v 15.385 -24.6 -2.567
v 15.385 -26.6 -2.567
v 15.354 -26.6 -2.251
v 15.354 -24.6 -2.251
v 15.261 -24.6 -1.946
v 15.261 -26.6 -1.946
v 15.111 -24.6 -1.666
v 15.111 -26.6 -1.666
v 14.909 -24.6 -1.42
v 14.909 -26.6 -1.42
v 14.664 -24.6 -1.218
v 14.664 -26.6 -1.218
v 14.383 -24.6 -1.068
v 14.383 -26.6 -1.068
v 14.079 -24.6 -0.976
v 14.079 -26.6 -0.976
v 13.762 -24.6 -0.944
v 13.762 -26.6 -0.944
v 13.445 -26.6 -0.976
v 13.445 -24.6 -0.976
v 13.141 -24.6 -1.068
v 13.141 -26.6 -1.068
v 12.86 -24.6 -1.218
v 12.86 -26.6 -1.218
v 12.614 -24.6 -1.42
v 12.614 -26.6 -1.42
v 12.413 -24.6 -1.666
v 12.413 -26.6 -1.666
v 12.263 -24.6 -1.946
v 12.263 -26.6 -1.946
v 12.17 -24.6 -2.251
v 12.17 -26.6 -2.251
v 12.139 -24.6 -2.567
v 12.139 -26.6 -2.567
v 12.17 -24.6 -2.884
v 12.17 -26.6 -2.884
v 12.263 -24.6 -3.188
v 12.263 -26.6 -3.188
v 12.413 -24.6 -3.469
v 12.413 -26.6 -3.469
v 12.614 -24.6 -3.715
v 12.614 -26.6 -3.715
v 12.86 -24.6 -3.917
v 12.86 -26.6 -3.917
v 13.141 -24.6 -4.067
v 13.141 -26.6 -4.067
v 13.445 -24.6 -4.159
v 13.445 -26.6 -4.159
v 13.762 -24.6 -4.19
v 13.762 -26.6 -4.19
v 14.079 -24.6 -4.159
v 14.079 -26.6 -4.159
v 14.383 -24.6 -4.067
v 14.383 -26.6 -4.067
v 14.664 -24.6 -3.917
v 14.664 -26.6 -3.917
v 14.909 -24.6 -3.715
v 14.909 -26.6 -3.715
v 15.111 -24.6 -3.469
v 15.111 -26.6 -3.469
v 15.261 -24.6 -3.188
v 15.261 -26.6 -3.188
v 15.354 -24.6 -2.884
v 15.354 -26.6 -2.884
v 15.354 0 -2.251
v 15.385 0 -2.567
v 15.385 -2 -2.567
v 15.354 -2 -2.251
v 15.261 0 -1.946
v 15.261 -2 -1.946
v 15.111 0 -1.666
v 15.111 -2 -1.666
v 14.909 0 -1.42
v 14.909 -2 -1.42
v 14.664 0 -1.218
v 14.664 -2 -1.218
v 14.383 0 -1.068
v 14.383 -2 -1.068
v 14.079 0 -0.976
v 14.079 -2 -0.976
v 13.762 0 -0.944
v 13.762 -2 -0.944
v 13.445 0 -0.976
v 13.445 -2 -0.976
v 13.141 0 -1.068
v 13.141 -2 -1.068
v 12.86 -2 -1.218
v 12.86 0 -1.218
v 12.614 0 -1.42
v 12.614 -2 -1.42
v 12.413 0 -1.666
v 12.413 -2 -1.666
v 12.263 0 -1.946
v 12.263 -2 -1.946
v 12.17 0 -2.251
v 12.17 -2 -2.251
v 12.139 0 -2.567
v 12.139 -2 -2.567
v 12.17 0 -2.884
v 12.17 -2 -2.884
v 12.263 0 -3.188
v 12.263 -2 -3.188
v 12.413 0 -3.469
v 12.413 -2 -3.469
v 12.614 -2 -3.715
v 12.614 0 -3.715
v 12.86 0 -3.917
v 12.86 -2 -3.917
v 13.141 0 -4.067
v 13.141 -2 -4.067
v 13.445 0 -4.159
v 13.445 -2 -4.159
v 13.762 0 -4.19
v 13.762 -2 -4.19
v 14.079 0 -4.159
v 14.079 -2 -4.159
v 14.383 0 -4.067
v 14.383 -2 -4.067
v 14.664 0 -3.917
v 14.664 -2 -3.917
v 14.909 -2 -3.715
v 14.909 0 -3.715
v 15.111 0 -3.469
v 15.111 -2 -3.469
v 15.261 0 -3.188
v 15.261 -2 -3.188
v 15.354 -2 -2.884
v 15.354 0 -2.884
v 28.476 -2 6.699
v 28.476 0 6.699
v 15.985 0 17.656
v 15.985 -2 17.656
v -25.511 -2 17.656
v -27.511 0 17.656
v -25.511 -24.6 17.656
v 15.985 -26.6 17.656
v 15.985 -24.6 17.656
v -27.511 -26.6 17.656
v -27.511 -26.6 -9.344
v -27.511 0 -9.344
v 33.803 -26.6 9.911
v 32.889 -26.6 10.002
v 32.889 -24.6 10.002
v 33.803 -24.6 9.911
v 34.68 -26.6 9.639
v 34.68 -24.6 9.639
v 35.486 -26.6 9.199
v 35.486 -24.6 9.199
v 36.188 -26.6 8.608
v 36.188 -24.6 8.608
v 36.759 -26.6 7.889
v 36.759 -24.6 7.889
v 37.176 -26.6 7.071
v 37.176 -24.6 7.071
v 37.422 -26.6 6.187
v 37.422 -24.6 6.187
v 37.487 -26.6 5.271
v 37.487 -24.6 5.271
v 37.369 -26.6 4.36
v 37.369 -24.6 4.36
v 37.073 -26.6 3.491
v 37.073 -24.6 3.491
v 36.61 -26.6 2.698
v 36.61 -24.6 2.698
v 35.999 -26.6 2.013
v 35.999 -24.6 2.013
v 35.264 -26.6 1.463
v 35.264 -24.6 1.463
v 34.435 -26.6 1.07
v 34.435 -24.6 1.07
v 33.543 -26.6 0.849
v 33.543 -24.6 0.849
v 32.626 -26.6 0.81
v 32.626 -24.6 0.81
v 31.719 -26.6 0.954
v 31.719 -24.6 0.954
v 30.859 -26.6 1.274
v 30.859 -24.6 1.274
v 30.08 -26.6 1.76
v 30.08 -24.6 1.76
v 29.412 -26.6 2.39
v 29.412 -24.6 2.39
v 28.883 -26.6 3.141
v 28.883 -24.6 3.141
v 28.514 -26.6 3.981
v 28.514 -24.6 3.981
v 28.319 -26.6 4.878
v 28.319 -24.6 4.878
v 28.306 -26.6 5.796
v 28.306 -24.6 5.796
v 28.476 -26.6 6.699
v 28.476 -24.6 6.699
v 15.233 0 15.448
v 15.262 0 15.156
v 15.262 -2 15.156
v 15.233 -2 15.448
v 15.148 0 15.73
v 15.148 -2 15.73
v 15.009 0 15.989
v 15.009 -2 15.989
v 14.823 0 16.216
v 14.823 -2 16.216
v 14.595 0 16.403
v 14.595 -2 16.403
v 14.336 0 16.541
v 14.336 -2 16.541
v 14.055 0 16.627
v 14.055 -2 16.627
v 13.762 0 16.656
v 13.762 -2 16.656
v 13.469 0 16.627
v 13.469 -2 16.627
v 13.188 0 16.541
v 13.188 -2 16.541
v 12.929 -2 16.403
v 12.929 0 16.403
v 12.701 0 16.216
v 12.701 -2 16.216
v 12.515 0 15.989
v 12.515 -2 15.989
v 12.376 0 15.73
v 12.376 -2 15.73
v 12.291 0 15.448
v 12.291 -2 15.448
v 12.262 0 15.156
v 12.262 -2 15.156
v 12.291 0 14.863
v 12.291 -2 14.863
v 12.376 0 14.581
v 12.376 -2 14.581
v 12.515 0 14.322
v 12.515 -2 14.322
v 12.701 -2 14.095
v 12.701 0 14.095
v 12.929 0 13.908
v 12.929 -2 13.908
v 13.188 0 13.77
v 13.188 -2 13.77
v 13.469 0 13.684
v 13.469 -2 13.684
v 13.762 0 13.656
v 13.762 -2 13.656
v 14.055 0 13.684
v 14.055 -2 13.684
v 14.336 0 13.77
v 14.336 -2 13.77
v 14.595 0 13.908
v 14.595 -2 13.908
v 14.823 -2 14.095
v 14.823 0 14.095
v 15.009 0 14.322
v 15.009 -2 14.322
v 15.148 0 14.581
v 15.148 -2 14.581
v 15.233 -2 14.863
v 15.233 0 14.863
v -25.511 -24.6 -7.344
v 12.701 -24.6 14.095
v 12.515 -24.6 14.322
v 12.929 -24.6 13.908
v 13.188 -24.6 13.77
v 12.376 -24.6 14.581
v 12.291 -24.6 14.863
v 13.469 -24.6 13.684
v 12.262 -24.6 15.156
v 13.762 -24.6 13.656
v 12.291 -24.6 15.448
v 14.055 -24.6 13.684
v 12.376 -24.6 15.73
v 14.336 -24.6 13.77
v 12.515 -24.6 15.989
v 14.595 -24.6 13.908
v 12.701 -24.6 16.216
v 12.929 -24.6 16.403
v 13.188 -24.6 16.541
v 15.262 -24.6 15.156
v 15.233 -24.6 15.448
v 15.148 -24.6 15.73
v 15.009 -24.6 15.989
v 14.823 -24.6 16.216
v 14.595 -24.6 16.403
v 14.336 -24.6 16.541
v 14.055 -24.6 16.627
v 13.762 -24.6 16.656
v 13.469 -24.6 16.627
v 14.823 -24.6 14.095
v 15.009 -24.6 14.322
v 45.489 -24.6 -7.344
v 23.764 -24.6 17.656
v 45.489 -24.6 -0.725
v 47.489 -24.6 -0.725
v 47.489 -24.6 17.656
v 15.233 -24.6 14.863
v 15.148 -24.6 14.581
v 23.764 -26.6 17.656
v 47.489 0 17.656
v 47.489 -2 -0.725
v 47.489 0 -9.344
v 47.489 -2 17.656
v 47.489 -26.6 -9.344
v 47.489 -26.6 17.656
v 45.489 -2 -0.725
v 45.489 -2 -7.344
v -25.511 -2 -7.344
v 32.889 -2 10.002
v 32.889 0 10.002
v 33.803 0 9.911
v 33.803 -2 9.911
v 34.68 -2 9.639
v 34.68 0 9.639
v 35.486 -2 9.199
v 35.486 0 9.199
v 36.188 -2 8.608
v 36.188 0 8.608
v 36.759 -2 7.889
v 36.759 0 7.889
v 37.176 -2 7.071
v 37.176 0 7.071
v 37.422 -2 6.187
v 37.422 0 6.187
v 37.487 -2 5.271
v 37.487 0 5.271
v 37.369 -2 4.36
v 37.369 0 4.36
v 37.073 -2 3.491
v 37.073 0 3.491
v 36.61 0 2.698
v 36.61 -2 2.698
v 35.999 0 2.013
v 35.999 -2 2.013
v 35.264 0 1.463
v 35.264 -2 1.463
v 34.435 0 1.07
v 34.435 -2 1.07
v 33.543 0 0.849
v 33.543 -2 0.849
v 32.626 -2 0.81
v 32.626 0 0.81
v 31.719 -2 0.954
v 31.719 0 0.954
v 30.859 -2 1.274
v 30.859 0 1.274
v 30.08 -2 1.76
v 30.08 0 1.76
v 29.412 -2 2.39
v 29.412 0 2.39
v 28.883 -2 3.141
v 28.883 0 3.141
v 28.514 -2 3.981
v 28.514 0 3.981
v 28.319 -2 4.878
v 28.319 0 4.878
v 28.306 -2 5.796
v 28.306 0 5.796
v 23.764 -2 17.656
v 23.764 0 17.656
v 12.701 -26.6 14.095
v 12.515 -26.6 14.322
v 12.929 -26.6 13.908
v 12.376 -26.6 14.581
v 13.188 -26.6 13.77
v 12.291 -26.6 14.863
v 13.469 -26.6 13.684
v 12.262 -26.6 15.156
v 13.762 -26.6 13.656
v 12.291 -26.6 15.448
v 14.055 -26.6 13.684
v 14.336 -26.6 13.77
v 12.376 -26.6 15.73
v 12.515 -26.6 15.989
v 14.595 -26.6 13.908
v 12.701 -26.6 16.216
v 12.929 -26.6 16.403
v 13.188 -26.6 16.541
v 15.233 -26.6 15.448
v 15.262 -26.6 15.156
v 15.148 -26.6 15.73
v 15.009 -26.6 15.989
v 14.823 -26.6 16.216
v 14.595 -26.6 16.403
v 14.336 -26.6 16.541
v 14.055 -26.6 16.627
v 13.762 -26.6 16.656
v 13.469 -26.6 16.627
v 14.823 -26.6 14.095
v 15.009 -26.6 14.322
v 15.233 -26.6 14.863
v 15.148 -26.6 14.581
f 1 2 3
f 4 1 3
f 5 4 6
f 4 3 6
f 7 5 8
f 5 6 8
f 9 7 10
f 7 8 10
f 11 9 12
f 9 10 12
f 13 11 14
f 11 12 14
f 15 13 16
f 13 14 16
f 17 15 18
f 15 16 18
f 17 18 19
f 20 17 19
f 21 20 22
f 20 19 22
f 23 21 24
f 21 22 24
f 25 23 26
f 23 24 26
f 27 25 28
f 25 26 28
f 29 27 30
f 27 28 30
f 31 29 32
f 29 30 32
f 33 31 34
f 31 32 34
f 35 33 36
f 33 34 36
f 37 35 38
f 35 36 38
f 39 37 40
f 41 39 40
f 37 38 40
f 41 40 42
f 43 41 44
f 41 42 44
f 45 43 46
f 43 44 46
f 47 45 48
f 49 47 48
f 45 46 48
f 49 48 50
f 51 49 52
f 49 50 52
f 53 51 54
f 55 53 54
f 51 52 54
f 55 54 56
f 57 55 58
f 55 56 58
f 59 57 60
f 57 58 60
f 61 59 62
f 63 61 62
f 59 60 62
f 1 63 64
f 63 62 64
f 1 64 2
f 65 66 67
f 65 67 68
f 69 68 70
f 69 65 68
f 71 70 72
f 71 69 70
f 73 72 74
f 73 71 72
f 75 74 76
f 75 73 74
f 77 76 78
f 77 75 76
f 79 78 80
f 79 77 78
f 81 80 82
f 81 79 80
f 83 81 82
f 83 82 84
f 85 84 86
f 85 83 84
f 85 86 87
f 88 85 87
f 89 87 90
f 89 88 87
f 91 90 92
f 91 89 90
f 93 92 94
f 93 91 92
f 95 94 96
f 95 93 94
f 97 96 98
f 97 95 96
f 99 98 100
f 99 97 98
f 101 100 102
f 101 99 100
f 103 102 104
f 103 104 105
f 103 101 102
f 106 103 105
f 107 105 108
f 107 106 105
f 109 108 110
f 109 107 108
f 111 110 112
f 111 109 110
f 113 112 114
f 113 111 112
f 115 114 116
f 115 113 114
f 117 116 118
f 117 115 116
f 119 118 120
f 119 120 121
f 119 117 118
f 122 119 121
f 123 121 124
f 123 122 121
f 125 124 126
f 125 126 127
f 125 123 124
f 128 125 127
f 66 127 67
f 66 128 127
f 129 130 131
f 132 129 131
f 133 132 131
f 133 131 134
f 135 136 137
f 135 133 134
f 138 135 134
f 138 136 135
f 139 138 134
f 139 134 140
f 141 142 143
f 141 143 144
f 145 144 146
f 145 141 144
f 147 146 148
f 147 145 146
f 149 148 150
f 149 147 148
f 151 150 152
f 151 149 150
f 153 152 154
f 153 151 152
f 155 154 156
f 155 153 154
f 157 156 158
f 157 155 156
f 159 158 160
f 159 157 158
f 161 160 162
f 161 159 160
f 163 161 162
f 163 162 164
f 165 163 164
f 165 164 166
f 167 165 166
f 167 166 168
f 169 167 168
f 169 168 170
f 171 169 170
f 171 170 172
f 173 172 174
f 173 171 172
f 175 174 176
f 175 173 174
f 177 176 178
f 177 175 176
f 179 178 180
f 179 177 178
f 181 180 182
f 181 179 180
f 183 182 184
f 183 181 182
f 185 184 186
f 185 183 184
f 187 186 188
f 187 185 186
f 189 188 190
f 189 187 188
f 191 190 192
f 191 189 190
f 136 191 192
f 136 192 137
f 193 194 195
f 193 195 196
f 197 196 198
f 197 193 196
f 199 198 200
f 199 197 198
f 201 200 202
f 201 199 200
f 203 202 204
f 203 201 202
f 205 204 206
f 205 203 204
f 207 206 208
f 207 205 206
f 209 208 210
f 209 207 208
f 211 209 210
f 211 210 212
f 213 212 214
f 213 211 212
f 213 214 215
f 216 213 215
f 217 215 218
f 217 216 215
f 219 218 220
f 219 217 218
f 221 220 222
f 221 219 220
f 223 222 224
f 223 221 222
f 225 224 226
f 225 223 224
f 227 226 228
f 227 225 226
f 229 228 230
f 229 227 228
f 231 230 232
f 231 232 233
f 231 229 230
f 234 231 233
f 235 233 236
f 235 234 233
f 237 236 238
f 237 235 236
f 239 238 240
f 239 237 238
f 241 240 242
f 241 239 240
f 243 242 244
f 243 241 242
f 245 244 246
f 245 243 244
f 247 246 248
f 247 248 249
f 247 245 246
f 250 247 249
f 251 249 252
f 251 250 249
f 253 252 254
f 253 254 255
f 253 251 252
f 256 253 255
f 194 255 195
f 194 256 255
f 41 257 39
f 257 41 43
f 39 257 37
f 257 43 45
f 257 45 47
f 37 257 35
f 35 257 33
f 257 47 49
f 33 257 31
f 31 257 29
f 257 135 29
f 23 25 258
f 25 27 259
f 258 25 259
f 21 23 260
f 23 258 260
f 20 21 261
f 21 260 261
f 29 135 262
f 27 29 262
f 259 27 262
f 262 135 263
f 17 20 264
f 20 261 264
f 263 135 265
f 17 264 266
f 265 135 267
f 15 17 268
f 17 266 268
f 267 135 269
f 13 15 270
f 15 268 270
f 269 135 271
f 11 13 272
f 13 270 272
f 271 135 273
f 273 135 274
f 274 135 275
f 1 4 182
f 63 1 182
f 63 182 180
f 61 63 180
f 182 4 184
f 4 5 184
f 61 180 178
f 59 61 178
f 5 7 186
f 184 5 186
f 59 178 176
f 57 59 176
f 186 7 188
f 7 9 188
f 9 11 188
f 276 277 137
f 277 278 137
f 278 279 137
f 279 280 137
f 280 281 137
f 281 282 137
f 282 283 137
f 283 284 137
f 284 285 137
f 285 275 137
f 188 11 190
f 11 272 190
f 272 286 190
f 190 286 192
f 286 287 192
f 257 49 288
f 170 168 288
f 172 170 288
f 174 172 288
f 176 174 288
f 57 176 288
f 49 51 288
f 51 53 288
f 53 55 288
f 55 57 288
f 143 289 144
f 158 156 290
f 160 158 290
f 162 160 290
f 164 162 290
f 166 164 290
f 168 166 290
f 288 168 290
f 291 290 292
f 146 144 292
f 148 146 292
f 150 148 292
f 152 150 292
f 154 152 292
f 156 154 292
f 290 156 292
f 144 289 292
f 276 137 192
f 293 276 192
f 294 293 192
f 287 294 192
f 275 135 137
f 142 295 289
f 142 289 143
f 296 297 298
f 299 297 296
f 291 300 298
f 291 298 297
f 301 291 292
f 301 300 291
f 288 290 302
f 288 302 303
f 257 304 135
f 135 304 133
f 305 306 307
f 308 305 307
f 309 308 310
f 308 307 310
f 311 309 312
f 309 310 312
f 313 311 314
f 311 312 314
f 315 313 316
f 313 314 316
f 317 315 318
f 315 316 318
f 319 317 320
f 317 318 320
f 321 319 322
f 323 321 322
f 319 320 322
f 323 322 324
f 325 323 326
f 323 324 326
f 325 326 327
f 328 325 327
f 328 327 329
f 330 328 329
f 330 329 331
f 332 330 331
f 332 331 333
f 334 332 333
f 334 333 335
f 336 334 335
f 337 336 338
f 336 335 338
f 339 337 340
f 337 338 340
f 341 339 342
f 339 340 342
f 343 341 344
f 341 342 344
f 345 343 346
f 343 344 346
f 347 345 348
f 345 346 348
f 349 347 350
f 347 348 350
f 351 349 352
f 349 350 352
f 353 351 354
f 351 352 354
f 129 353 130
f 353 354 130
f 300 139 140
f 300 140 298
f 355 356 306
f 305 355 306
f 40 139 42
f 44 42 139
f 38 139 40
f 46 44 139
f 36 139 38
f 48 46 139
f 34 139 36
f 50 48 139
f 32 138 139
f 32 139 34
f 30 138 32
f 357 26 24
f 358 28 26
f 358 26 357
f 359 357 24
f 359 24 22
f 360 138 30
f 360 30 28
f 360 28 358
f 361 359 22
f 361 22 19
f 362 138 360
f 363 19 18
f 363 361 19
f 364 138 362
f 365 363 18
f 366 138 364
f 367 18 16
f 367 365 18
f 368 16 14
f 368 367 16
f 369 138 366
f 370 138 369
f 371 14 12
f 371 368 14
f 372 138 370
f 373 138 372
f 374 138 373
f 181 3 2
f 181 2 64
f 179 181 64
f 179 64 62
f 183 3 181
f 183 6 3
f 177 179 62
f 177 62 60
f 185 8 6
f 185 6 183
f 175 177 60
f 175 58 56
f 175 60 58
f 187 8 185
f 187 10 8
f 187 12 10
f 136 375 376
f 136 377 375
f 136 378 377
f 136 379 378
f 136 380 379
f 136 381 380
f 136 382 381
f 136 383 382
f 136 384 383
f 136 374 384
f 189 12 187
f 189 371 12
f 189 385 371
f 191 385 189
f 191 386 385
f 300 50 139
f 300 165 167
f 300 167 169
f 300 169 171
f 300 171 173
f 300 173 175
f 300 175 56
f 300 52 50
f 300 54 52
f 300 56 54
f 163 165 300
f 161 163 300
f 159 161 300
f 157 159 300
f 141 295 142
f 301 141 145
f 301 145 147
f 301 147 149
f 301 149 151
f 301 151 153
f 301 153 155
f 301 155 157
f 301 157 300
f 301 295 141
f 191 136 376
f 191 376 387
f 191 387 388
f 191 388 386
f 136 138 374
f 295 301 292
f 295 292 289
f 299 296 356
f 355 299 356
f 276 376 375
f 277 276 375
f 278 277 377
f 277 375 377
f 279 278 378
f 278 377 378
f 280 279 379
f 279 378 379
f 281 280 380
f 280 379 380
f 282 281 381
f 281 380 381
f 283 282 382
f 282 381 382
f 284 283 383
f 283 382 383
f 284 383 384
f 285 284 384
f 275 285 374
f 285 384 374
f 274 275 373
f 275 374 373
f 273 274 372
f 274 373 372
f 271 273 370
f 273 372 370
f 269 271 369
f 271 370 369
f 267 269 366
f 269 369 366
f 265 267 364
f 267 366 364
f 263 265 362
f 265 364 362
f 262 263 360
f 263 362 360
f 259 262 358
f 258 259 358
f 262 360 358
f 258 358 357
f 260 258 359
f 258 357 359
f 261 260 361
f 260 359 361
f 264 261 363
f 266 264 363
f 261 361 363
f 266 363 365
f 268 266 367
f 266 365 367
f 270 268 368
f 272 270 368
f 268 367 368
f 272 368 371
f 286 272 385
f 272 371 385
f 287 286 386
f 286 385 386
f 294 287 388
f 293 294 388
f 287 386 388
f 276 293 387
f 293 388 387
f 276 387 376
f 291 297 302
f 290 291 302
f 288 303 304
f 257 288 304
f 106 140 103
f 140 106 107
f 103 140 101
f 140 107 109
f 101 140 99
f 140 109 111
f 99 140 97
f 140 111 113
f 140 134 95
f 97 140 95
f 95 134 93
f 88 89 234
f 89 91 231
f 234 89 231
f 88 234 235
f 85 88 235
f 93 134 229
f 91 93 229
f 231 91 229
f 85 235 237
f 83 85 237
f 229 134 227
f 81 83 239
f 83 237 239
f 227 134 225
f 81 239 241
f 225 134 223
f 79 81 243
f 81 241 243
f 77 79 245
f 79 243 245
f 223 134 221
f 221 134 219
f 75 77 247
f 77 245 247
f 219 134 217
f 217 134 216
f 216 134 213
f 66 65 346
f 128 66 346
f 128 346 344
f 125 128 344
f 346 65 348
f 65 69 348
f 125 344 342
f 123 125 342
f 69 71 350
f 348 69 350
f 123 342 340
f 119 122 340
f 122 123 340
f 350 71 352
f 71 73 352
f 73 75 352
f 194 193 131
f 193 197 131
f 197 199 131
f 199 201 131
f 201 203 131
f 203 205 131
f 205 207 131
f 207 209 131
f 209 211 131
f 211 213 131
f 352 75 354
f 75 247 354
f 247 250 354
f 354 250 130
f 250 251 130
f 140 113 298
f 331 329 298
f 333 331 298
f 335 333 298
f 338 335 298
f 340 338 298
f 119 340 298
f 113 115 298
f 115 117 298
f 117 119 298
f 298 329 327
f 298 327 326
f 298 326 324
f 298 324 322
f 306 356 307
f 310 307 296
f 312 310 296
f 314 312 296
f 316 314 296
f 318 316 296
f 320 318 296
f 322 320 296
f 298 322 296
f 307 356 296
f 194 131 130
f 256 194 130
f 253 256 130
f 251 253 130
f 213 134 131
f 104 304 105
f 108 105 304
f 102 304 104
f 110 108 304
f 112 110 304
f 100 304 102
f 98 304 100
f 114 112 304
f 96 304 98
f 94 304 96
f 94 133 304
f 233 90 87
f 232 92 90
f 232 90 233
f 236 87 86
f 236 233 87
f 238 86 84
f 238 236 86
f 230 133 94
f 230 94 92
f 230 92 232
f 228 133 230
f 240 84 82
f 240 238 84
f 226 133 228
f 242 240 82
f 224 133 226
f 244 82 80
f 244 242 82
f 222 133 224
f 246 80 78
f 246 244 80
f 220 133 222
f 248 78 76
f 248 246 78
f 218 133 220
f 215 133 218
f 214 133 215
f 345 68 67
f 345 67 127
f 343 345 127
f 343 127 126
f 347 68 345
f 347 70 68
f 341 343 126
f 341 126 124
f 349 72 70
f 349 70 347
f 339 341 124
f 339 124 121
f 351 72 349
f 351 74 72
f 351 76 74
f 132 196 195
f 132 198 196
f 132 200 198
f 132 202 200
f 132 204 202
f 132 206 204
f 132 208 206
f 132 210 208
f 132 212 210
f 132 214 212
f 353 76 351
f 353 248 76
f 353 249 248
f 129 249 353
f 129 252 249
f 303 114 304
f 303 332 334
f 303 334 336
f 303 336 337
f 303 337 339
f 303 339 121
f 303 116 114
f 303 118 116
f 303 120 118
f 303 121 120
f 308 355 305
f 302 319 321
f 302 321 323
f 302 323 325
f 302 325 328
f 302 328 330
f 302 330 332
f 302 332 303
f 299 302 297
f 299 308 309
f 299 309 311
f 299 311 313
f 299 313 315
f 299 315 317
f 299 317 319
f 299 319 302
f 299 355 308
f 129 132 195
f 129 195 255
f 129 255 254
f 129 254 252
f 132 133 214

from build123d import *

# Parameters (mm, degrees)
F0_R     = 1.6228665853
F0_R_2   = 1.5
F0_W     = 2
F0_H     = 25
F1_DEPTH = 2
F2_DEPTH = 25.6
F3_DEPTH = 24.6


with BuildPart() as f1:
    # F0 (on Front) → F1 (new body)
    with BuildSketch(Plane.XZ):
        with BuildLine():
            Line((47.4890847677, -0.7248306477), (47.4890847677, 6.2918234199))
            Line((47.4890847677, 6.2918234199), (47.4890847677, 17.6555038384))
            Line((47.4890847677, 17.6555038384), (23.7640682912, 17.6555038384))
            Line((23.7640682912, 17.6555038384), (32.8890847677, 10.0022964448))
            ThreePointArc((32.8890847677, 10.0022964448), (35.6455609426, 1.7196562102), (28.4755586515, 6.6987482262))
            Line((28.4755586515, 6.6987482262), (15.9851853108, 17.6555038384))
            Line((15.9851853108, 17.6555038384), (-5.2803540298, 17.6555038384))
            Line((-5.2803540298, 17.6555038384), (-25.5109152323, 17.6555038384))
            Line((-25.5109152323, 17.6555038384), (-25.5109152323, -7.3444961616))
            Line((-25.5109152323, -7.3444961616), (1.1948530817, -7.3444961616))
            Line((1.1948530817, -7.3444961616), (45.4890847677, -7.3444961616))
            Line((45.4890847677, -7.3444961616), (45.4890847677, -0.7248306477))
            Line((45.4890847677, -0.7248306477), (47.4890847677, -0.7248306477))
        make_face()
        with Locations((13.761951353, -2.5673627469)):
            Circle(F0_R, mode=Mode.SUBTRACT)
        with Locations((13.761951353, 15.1555038384)):
            Circle(F0_R_2, mode=Mode.SUBTRACT)
        Polygon((47.4890847677, -9.3444961616), (47.4890847677, -0.7248306477), (45.4890847677, -0.7248306477), (45.4890847677, -7.3444961616), (45.4890847677, -9.3444961616), align=None)
        Polygon((5.9280249222, -9.3444961616), (45.4890847677, -9.3444961616), (45.4890847677, -7.3444961616), (1.1948530817, -7.3444961616), (-25.5109152323, -7.3444961616), (-27.5109152323, -7.3444961616), (-27.5109152323, -9.3444961616), align=None)
        with Locations((-26.5109152323, 5.1555038384)):
            Rectangle(F0_W, F0_H)
    extrude(amount=F1_DEPTH)

    # F0 (on Front) → F2 (join)
    with BuildSketch(Plane.XZ):
        Polygon((47.4890847677, -9.3444961616), (47.4890847677, -0.7248306477), (45.4890847677, -0.7248306477), (45.4890847677, -7.3444961616), (45.4890847677, -9.3444961616), align=None)
        Polygon((5.9280249222, -9.3444961616), (45.4890847677, -9.3444961616), (45.4890847677, -7.3444961616), (1.1948530817, -7.3444961616), (-25.5109152323, -7.3444961616), (-27.5109152323, -7.3444961616), (-27.5109152323, -9.3444961616), align=None)
    extrude(amount=F2_DEPTH)

    # F0 (on Front) → F3 (join)
    with BuildSketch(Plane.XZ):
        with Locations((-26.5109152323, 5.1555038384)):
            Rectangle(F0_W, F0_H)
    extrude(amount=F3_DEPTH)

    # F5: F1 across plane


with BuildPart() as f1_1:
    add(f1.part)
    add(f1.part.mirror(Plane.XZ.offset(13.3)))


solid = f1_1.part
